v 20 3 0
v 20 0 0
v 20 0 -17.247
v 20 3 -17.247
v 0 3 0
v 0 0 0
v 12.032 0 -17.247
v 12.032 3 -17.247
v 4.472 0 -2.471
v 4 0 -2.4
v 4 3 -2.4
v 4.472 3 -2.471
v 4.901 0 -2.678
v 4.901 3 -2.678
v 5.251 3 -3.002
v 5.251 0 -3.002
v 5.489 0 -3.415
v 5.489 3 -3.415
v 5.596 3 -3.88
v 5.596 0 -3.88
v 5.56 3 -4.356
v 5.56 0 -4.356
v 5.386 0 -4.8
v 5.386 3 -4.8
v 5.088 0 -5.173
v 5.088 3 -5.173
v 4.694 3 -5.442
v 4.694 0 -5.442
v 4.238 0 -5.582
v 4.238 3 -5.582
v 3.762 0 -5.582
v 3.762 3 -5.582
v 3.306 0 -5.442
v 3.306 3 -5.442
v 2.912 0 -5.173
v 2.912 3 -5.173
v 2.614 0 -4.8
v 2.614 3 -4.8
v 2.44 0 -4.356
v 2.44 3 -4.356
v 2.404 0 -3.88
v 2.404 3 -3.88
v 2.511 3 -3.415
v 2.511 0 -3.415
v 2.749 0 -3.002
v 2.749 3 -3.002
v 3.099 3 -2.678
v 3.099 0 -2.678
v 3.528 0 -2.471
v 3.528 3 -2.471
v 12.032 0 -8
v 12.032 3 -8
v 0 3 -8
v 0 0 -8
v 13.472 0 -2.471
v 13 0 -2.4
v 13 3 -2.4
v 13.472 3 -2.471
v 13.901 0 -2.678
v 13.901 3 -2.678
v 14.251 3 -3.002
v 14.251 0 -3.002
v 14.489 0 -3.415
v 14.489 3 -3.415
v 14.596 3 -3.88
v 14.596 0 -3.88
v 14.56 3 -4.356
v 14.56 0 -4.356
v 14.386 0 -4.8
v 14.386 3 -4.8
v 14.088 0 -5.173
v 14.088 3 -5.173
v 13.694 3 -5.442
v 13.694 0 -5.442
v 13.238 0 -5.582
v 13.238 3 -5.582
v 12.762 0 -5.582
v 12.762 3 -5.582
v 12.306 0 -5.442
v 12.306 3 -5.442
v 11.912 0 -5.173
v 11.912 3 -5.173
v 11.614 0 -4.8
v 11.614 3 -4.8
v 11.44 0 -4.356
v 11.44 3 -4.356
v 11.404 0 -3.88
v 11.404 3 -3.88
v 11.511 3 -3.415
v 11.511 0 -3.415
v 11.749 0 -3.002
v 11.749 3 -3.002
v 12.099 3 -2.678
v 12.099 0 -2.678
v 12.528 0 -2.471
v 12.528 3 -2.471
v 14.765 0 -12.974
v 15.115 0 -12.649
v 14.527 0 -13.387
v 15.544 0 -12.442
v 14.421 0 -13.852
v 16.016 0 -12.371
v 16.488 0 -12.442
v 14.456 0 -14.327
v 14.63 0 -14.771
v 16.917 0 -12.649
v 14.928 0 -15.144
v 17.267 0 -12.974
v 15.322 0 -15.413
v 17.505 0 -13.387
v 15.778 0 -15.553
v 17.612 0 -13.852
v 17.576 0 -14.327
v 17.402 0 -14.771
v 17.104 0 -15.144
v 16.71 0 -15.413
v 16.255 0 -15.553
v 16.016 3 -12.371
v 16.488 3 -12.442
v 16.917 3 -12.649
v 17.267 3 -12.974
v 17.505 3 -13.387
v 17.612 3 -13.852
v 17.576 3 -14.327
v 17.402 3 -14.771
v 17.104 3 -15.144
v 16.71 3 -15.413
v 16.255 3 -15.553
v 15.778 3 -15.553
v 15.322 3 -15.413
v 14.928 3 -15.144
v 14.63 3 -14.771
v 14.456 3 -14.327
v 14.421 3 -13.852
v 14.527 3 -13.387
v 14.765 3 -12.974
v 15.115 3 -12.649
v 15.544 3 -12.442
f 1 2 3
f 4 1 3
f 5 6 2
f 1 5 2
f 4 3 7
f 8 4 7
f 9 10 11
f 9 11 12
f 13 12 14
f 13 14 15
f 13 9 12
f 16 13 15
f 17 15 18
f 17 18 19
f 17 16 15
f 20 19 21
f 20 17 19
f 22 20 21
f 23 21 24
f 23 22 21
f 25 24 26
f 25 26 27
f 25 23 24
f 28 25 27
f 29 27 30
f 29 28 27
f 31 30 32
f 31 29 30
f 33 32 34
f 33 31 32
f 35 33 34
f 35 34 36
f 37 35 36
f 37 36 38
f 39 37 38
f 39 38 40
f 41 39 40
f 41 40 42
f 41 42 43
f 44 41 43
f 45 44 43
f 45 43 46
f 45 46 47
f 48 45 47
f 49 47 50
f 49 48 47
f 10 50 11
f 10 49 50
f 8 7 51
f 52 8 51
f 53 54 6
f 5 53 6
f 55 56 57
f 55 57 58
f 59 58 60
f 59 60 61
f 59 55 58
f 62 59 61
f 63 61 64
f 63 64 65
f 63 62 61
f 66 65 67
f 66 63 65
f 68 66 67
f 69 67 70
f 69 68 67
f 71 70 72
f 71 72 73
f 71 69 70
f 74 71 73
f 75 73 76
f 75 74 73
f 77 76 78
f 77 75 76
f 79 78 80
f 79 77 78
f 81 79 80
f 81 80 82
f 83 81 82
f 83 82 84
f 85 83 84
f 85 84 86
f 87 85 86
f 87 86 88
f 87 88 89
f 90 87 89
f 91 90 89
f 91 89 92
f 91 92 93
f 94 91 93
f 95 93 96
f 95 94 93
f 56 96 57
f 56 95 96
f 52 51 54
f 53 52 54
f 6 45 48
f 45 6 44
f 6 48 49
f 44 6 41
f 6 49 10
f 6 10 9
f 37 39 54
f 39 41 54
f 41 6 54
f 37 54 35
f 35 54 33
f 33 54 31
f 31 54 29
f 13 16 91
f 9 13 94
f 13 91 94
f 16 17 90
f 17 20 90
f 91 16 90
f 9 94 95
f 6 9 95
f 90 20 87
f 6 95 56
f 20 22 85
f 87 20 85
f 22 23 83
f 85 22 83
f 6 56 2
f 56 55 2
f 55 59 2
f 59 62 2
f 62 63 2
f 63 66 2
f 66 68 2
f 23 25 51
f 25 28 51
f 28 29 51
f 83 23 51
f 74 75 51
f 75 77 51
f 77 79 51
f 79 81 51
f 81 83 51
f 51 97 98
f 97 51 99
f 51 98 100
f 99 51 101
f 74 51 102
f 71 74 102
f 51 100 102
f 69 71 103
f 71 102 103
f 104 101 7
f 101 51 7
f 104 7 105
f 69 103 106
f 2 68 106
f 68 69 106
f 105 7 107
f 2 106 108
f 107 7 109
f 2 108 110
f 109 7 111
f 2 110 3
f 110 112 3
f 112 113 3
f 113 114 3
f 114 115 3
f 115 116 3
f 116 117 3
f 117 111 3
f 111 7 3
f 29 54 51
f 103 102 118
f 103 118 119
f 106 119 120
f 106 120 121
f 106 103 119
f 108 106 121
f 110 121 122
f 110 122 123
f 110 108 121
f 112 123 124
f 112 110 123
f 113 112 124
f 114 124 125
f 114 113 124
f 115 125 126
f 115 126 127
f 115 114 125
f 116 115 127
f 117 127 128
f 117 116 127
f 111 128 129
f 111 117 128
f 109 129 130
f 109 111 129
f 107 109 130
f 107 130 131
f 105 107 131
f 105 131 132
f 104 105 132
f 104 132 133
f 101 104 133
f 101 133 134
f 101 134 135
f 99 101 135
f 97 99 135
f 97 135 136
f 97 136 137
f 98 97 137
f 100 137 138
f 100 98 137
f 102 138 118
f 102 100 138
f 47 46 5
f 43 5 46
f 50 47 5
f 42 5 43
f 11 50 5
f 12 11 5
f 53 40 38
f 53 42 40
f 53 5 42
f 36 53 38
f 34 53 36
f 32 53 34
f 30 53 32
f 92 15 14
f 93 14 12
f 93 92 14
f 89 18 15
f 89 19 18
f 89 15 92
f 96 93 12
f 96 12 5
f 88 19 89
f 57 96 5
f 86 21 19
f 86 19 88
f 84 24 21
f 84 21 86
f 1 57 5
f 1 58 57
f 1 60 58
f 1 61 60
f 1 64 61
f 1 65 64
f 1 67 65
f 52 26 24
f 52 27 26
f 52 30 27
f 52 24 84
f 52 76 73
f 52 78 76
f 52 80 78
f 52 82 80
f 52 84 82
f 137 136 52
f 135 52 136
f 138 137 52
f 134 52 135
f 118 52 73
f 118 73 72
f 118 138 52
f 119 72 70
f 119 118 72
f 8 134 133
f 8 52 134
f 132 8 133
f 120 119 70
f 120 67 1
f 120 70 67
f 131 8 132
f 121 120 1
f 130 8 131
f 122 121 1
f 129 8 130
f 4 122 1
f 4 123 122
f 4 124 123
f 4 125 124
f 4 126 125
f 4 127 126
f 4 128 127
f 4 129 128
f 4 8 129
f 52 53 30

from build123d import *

# Parameters (mm, degrees)
SKETCH_1_R      = 1.6
EXTRUDE_1_DEPTH = 3


with BuildPart() as part:
    # 草图1 → 凸台-拉伸1 (new body)
    with BuildSketch(Plane(origin=(0, 0, 0), x_dir=(1, 0, 0), z_dir=(0, 1, 0))):
        Polygon((0, 0), (20, 0), (20, 8), (20, 17.247388719), (12.032168205, 17.247388719), (12.032168205, 8), (0, 8), align=None)
        with Locations(Location((4, 4, 0), (0, 0, 270))):
            Circle(SKETCH_1_R, mode=Mode.SUBTRACT)
        with Locations(Location((13, 4, 0), (0, 0, 270))):
            Circle(SKETCH_1_R, mode=Mode.SUBTRACT)
        with Locations(Location((16.016084103, 13.971325548, 0), (0, 0, 270))):
            Circle(SKETCH_1_R, mode=Mode.SUBTRACT)
    extrude(amount=EXTRUDE_1_DEPTH)


solid = part.part
